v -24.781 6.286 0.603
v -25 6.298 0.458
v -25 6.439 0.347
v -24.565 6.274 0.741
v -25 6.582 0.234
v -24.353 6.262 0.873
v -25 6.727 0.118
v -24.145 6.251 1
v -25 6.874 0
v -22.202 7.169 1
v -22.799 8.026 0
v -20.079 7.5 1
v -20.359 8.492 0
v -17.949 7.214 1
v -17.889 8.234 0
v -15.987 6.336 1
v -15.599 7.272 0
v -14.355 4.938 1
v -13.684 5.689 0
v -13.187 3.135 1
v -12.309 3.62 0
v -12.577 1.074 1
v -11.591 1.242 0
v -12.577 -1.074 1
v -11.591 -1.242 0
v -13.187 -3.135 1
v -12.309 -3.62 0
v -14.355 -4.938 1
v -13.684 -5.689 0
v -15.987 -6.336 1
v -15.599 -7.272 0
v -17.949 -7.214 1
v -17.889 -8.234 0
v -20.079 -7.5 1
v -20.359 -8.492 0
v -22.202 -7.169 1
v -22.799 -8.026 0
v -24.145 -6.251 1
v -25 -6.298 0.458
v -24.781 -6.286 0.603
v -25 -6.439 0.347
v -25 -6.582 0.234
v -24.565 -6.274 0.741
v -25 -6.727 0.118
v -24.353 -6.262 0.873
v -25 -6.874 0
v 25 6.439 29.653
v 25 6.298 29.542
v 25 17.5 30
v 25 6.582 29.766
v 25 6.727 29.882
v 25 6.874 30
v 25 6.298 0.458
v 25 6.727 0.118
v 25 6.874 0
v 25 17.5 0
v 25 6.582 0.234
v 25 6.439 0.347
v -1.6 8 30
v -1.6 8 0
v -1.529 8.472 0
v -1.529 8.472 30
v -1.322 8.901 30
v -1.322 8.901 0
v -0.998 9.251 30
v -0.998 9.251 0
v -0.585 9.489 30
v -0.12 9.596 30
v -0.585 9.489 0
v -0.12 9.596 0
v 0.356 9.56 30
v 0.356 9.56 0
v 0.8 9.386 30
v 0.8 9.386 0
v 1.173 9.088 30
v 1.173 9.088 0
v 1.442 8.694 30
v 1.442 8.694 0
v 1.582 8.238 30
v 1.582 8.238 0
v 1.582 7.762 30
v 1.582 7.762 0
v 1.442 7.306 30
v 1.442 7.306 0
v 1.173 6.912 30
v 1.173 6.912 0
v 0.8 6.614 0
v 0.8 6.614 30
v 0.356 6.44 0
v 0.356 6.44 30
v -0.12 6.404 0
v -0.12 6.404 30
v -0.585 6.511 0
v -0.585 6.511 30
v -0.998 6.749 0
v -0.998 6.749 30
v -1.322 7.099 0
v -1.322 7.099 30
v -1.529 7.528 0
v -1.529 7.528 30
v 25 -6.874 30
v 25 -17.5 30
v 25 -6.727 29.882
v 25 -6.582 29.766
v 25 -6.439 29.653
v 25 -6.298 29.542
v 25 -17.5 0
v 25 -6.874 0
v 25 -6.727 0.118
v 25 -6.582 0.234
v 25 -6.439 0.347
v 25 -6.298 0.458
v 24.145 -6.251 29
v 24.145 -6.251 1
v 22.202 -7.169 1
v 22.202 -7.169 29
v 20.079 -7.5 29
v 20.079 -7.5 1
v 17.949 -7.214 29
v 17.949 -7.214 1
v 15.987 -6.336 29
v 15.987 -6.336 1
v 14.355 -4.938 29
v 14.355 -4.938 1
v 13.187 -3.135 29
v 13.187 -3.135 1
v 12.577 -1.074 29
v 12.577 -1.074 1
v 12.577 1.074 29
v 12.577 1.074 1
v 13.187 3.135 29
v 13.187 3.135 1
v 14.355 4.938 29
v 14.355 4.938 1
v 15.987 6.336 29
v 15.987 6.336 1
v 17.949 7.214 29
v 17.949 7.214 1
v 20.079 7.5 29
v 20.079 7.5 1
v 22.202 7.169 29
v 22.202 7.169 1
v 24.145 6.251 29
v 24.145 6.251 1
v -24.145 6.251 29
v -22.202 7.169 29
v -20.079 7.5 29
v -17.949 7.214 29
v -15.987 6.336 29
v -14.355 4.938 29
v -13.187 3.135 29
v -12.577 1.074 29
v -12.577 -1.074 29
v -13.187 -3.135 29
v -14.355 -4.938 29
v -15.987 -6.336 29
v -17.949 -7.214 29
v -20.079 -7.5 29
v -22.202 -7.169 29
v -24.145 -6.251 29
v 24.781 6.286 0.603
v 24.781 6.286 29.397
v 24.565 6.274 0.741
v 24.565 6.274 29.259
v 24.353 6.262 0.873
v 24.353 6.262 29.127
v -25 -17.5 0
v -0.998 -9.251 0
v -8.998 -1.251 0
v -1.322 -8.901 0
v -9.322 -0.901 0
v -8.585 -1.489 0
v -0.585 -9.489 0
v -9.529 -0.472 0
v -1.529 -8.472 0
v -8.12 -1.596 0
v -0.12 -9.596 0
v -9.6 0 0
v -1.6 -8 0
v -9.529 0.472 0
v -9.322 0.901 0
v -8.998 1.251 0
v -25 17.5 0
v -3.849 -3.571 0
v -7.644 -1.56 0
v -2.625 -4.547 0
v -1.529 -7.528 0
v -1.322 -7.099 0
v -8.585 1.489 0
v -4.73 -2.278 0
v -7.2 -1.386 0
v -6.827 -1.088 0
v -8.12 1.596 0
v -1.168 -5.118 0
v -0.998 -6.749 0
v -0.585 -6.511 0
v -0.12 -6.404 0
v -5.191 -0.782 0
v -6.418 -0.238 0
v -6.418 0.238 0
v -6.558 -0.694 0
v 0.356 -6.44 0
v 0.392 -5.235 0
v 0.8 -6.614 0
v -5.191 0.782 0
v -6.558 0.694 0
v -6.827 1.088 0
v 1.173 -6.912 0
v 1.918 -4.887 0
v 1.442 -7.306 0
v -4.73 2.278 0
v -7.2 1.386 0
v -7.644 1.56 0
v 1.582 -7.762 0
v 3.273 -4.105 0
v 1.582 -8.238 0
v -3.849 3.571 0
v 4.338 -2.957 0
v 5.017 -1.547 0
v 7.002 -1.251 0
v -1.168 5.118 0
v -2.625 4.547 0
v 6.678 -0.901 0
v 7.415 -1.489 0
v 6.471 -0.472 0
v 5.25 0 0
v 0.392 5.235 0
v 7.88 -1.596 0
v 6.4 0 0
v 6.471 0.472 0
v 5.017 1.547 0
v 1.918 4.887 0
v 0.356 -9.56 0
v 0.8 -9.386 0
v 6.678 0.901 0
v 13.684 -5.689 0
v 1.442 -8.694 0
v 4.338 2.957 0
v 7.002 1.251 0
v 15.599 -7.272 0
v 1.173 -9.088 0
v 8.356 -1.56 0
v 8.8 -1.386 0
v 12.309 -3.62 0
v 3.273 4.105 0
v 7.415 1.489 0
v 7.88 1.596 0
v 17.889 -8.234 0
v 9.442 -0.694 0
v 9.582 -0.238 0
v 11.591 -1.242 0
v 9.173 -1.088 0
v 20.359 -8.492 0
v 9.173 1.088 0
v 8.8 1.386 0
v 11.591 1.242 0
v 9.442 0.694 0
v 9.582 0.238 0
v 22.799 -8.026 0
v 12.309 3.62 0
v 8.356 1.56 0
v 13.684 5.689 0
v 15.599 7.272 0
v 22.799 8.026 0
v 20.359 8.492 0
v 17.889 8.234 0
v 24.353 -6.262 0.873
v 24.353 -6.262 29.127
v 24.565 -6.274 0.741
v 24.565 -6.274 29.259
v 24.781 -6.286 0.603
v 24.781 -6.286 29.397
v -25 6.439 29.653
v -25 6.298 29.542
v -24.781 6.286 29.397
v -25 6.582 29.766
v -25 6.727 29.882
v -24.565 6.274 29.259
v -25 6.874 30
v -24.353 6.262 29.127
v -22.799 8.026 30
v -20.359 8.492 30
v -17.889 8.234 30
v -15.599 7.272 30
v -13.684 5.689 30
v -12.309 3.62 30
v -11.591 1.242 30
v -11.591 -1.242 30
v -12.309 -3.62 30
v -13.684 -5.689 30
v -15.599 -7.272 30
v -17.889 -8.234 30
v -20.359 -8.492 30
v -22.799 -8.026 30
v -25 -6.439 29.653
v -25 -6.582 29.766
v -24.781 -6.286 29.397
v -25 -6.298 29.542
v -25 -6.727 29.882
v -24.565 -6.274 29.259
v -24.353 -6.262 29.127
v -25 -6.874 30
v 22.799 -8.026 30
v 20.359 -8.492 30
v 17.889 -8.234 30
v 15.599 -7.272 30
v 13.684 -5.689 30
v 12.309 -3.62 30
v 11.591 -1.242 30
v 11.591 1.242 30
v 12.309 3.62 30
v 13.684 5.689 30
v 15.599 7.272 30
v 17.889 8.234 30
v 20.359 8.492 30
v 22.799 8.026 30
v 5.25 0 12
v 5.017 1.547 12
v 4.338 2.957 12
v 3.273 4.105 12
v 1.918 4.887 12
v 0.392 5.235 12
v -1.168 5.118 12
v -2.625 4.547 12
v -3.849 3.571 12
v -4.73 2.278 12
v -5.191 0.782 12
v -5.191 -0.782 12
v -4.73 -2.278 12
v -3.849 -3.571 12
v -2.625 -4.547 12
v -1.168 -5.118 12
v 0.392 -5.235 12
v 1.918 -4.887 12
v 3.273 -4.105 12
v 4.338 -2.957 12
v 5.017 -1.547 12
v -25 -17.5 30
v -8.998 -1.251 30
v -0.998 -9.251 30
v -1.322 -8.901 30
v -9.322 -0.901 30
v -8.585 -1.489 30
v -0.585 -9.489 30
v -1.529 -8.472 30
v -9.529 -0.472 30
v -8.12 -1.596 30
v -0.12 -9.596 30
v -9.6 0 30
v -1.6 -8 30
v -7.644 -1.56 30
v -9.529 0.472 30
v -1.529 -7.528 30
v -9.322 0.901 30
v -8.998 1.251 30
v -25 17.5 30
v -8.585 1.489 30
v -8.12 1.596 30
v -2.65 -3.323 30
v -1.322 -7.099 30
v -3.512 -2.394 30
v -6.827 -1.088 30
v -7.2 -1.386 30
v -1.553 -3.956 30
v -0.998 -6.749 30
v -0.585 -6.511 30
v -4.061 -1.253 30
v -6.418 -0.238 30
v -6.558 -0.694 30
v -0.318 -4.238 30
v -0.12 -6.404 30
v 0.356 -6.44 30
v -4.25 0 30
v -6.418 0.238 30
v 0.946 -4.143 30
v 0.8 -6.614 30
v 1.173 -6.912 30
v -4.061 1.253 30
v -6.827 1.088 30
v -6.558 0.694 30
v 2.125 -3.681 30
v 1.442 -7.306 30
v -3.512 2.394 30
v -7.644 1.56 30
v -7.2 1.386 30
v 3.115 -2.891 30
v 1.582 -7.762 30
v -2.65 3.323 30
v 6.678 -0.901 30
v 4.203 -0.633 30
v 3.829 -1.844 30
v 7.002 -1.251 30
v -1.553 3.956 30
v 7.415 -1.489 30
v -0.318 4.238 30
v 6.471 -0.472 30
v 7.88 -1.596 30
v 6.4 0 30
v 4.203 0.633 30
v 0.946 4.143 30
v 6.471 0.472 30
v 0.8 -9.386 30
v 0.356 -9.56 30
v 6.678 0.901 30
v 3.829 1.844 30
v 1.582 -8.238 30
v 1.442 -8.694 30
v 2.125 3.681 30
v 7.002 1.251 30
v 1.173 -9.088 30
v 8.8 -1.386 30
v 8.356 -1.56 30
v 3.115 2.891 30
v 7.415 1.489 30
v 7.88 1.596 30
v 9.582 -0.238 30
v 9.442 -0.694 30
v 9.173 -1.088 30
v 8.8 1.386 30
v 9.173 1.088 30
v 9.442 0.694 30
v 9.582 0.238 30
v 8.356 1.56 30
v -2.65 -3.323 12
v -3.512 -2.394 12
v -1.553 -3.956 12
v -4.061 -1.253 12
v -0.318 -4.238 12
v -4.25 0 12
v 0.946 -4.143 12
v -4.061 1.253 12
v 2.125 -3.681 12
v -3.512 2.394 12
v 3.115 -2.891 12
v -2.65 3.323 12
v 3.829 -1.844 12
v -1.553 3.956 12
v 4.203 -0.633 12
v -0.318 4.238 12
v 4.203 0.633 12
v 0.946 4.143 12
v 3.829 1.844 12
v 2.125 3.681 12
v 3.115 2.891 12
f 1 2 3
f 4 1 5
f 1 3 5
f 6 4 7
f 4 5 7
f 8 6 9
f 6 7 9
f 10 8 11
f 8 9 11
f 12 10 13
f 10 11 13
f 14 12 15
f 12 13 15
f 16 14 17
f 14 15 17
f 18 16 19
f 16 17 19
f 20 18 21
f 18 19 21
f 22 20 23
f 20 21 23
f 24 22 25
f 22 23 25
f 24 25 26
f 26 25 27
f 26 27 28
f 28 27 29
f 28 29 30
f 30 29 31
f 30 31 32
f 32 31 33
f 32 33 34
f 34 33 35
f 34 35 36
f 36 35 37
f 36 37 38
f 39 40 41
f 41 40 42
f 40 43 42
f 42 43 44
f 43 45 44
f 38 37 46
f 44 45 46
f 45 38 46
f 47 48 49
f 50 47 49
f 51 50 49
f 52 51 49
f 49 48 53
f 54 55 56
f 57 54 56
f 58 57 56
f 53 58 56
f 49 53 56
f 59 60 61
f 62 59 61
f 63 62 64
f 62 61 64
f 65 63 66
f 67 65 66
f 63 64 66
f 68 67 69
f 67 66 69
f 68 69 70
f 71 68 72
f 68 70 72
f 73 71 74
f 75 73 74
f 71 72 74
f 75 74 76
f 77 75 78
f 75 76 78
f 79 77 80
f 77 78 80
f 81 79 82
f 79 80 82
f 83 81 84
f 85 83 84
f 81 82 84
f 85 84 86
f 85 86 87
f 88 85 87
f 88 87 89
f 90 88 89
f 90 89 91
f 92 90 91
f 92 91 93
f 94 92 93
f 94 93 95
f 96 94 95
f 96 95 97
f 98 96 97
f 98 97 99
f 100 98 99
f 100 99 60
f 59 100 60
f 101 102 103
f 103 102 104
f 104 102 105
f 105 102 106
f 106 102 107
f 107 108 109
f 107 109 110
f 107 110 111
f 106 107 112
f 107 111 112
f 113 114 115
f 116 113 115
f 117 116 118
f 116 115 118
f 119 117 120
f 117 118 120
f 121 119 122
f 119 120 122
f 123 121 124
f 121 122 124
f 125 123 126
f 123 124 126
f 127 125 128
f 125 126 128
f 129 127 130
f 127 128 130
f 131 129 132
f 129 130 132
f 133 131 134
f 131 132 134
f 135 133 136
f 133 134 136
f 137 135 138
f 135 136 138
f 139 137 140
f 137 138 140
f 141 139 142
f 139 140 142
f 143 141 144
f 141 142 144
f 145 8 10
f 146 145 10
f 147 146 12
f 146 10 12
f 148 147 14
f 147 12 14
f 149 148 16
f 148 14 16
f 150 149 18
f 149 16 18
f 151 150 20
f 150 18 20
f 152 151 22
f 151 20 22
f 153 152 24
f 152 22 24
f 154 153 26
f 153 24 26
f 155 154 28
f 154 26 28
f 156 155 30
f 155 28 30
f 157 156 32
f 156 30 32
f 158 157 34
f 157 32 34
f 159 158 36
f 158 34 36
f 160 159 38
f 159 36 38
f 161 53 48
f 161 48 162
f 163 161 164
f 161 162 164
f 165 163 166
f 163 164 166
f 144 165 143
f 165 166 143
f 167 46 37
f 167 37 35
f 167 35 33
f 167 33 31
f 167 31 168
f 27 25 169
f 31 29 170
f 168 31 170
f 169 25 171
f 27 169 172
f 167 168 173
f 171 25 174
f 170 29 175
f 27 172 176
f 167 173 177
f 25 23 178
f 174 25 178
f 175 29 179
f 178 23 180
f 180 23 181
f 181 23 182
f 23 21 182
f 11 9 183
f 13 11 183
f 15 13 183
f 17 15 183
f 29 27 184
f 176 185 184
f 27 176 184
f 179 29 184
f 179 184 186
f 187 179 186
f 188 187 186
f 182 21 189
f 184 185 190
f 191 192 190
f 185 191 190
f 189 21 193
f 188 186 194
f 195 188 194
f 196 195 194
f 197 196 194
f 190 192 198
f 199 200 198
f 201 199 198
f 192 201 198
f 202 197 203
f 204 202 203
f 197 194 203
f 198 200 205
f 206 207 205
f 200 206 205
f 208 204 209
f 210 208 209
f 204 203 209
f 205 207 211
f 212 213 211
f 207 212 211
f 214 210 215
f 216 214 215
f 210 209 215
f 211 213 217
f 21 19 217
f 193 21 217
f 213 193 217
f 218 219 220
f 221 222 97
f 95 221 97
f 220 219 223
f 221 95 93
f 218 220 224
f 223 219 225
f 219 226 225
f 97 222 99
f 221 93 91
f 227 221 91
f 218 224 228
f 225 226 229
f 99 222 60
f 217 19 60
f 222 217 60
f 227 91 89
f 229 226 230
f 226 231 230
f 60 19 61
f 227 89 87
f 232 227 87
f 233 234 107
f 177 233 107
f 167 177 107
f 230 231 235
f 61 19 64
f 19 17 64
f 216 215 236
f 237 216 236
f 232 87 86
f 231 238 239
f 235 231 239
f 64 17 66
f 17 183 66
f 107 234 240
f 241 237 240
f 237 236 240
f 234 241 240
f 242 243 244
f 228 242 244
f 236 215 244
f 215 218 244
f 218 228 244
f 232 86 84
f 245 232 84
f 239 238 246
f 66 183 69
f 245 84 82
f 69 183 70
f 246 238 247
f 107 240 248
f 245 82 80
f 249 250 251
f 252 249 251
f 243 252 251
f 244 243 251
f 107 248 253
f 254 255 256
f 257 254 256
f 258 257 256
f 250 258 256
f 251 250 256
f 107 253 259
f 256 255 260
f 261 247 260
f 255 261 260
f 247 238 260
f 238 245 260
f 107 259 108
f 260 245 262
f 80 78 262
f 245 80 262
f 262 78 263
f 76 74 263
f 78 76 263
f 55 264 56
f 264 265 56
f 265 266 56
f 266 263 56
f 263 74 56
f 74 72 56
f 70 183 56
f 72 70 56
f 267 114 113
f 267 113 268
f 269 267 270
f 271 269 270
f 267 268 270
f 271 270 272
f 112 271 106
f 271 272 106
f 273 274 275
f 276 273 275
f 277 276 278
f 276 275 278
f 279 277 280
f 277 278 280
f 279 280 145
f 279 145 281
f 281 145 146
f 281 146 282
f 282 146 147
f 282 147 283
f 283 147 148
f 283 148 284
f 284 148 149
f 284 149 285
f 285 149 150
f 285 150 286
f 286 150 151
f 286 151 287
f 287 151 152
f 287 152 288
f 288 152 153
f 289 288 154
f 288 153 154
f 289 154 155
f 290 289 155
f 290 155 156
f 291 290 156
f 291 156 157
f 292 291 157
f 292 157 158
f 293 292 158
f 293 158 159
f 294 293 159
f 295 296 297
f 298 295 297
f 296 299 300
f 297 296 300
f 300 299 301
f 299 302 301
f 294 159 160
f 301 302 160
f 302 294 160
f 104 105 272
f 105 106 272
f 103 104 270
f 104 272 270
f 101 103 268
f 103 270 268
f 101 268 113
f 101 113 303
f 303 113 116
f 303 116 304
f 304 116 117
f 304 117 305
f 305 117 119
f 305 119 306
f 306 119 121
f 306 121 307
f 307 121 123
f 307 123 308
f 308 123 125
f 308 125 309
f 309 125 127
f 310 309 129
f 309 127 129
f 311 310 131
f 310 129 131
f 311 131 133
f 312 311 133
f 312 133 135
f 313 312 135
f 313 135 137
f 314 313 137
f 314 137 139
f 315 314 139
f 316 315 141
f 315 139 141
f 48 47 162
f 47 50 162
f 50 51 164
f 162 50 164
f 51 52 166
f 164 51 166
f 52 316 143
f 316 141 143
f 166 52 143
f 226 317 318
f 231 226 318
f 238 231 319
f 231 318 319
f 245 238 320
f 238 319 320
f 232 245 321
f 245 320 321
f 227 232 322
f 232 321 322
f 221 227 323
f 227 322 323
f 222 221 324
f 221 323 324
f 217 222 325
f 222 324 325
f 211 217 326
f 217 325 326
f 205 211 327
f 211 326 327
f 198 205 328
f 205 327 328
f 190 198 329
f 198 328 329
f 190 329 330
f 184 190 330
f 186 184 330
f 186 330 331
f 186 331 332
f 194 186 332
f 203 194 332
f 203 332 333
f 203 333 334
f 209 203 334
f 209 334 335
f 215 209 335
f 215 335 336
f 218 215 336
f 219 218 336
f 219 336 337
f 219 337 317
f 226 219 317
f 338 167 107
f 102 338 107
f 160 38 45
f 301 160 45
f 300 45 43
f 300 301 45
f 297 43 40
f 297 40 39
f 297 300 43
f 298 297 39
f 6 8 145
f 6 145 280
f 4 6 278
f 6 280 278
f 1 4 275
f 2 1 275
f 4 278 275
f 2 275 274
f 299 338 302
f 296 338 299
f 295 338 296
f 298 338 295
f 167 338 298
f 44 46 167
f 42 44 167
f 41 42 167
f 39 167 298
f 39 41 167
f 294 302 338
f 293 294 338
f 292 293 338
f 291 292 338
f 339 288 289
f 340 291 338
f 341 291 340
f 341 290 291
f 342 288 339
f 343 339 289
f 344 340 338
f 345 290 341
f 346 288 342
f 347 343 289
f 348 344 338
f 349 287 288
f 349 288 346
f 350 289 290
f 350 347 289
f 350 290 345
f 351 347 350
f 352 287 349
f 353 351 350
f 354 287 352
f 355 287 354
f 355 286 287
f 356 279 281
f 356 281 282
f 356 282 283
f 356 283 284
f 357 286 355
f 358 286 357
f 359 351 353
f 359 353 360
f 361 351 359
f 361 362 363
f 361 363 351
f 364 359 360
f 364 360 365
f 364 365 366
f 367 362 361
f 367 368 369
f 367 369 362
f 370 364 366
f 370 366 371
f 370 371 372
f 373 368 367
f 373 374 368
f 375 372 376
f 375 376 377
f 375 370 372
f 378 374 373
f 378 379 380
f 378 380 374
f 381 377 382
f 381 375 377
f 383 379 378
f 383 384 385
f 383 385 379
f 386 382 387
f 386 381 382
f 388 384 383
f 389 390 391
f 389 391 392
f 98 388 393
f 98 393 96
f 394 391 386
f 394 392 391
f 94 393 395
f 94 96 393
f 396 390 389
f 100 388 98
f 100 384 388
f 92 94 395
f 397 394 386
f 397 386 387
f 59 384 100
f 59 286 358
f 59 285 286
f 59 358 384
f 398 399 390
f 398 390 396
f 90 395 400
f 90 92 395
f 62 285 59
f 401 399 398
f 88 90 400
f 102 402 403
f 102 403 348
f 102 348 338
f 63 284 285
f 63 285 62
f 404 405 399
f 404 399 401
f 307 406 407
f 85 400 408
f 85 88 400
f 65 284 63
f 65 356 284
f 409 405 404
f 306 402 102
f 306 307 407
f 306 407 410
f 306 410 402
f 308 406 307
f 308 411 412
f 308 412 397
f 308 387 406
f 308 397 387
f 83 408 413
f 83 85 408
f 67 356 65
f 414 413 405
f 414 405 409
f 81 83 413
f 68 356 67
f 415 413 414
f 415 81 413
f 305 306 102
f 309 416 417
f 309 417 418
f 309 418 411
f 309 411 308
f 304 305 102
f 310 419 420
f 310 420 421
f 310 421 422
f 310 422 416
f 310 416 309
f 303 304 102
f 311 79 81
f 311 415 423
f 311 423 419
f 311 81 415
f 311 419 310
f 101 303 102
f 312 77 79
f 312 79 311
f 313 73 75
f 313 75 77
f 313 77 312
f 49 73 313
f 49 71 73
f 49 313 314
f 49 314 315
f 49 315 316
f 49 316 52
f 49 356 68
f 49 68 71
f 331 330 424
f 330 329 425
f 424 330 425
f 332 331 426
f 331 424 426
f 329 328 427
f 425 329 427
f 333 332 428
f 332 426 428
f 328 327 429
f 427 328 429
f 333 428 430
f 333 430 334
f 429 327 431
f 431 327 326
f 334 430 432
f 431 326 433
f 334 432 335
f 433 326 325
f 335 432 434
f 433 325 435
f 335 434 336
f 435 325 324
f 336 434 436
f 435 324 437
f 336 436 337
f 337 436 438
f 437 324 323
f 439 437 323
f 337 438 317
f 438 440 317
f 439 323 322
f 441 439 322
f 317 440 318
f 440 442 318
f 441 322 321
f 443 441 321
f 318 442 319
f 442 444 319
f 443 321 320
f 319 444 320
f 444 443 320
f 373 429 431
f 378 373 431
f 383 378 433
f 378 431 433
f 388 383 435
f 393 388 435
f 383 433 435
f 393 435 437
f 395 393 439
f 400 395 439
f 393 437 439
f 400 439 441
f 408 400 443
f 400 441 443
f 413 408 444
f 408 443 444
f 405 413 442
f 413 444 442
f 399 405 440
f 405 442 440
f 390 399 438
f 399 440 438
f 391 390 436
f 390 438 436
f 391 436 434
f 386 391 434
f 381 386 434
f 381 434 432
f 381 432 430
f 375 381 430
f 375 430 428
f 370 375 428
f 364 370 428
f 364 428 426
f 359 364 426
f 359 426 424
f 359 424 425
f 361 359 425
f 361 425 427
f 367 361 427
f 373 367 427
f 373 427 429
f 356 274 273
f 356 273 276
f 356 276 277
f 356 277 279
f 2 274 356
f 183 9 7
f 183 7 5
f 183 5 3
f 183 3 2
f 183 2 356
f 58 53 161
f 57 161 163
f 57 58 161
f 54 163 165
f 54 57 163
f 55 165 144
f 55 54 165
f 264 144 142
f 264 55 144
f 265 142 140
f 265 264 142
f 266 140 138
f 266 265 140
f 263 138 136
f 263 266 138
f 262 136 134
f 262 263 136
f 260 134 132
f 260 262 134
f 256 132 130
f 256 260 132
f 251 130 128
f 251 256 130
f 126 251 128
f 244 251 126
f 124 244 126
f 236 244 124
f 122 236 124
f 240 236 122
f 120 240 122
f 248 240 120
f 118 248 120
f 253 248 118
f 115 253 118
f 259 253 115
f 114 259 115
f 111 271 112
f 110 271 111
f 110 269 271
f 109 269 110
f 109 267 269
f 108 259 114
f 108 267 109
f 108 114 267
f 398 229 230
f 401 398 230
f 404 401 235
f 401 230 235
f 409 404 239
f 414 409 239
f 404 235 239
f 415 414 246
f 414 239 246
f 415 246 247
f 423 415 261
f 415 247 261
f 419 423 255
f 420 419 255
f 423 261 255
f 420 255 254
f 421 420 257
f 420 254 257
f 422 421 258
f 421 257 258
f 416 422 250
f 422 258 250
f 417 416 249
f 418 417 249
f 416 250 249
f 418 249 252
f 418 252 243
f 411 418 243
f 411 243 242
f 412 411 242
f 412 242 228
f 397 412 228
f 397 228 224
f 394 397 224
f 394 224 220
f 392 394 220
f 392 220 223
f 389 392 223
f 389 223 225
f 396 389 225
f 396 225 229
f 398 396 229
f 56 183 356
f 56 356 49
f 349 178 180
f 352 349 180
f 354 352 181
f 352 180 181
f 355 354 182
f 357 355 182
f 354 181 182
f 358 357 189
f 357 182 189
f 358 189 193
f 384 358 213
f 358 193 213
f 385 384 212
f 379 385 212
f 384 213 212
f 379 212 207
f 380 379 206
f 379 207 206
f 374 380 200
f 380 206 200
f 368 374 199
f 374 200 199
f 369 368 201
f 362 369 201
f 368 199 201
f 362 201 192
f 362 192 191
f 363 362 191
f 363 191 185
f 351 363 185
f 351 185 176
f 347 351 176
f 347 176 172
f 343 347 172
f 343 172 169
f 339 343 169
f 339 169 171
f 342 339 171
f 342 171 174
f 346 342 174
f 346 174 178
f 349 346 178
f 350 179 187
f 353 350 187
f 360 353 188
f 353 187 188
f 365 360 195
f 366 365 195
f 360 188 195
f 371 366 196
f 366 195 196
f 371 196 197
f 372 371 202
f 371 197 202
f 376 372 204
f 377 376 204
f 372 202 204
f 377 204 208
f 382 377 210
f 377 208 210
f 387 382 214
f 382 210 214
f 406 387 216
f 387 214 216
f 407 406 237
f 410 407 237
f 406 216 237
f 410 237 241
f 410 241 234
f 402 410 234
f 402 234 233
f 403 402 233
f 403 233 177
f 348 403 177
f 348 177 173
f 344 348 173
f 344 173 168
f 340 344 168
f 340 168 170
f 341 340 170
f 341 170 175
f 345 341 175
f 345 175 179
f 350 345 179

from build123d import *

# Parameters (mm, degrees)
SKETCH_1_W          = 50
SKETCH_1_H          = 35
EXTRUDE_1_DEPTH     = 30
HOLE_WIZARD_345_D   = 8.5
HOLE_WIZARD_450_D   = 3.2
HOLE_WIZARD_604_D   = 15
CHAMFER_1_SIZE      = 1
CHAMFER_1_SIZE_2    = 0.708203932
HOLE_WIZARD_1_D     = 10.5
HOLE_WIZARD_1_DEPTH = 12


with BuildPart() as part:
    # 草图1 → 凸台-拉伸1 (new body)
    with BuildSketch(Plane.XY):
        Rectangle(SKETCH_1_W, SKETCH_1_H)
    extrude(amount=EXTRUDE_1_DEPTH)

    # Hole Wizard 345 (through all)
    with Locations(Plane.XY.offset(30)):
        with Locations((0, 0)):
            Hole(HOLE_WIZARD_345_D / 2)

    # Hole Wizard 450 (through all)
    with Locations(Plane.XY.offset(30)):
        with Locations((8, 0), (0, 8), (-8, 0), (0, -8)):
            Hole(HOLE_WIZARD_450_D / 2)

    # Hole Wizard 604 (through all)
    with Locations(Plane.XY.offset(30)):
        with Locations((20, 0), (-20, 0)):
            Hole(HOLE_WIZARD_604_D / 2)

    # 倒角1
    # the kernel refuses this chamfer: 1, 0.708203932 mm, written as the material it takes off along each edge
    with BuildSketch(Plane(origin=(-20, 0, 0), x_dir=(-0.8790200859122482, 0.4767847402789059, 0), z_dir=(-0.4767847402789059, -0.8790200859122482, 0))) as chamfer_1_piece_1:
        Polygon((7.5, -CHAMFER_1_SIZE), (7.5 + CHAMFER_1_SIZE, 0), (7.5, 0), align=None)
    revolve(axis=Axis((-20, 0, 0), (0, 0, -1)), revolution_arc=303.048763938, mode=Mode.SUBTRACT)
    with BuildSketch(Plane(origin=(-20, 0, 30), x_dir=(-0.879020085912248, 0.47678474027890627, 0), z_dir=(-0.47678474027890627, -0.879020085912248, 0))) as chamfer_1_piece_2:
        Polygon((7.5 + CHAMFER_1_SIZE, 0), (7.5, CHAMFER_1_SIZE), (7.5, 0), align=None)
    revolve(axis=Axis((-20, 0, 30), (0, 0, -1)), revolution_arc=303.048763938, mode=Mode.SUBTRACT)
    with BuildSketch(Plane(origin=(20, 0, 30), x_dir=(0.879020085912248, -0.4767847402789061, 0), z_dir=(0.4767847402789061, 0.879020085912248, 0))) as chamfer_1_piece_3:
        Polygon((7.5 + CHAMFER_1_SIZE, 0), (7.5, CHAMFER_1_SIZE), (7.5, 0), align=None)
    revolve(axis=Axis((20, 0, 30), (0, 0, -1)), revolution_arc=303.048763938, mode=Mode.SUBTRACT)
    with BuildSketch(Plane(origin=(20, 0, 0), x_dir=(0.8790200859122481, 0.476784740278906, 0), z_dir=(0.476784740278906, -0.8790200859122481, 0))) as chamfer_1_piece_4:
        Polygon((7.5, CHAMFER_1_SIZE), (7.5 + CHAMFER_1_SIZE, 0), (7.5, 0), align=None)
    revolve(axis=Axis((20, 0, 0), (0, 0, 1)), revolution_arc=303.048763938, mode=Mode.SUBTRACT)
    with BuildSketch(Plane(origin=(-25, 5.590169944, 32.778051389), x_dir=(0.7914486393779661, 0.611235675682274, 0), z_dir=(0, 0, -1)), Plane(origin=(25, -5.590169944, 32.778051389), x_dir=(-0.7914486393779661, -0.611235675682274, 0), z_dir=(0, 0, -1))) as chamfer_1_piece_5:
        with BuildLine():
            Line((1.080663788, 0), (CHAMFER_1_SIZE_2 * 0.611235676113, -CHAMFER_1_SIZE_2 * 0.791448639936))
            Line((CHAMFER_1_SIZE_2 * 0.611235676113, -CHAMFER_1_SIZE_2 * 0.791448639936), (0, 0))
            ThreePointArc((0, 0), (0.555522087, -0.019473843), (1.080663788, 0))
        make_face()
    extrude(amount=35.556102778, mode=Mode.SUBTRACT)
    with BuildSketch(Plane(origin=(-25, -5.590169944, 32.778051389), x_dir=(0.7914486393779665, -0.6112356756822735, 0), z_dir=(0, 0, -1))) as chamfer_1_piece_6:
        with BuildLine():
            Line((1.080663788, 0), (CHAMFER_1_SIZE_2 * 0.611235676113, CHAMFER_1_SIZE_2 * 0.791448639936))
            Line((CHAMFER_1_SIZE_2 * 0.611235676113, CHAMFER_1_SIZE_2 * 0.791448639936), (0, 0))
            ThreePointArc((0, 0), (0.555522087, 0.019473843), (1.080663788, 0))
        make_face()
    extrude(amount=35.556102778, mode=Mode.SUBTRACT)
    with BuildSketch(Plane(origin=(25, 5.590169944, 32.778051389), x_dir=(0, 1, 0), z_dir=(0, 0, -1))) as chamfer_1_piece_7:
        with BuildLine():
            Line((CHAMFER_1_SIZE_2, 0), (0.660540261, -0.855289885))
            ThreePointArc((0.660540261, -0.855289885), (0.354967464, -0.427764092), (0, 0))
            Line((0, 0), (CHAMFER_1_SIZE_2, 0))
        make_face()
    extrude(amount=35.556102778, mode=Mode.SUBTRACT)

    # 孔1
    with Locations(Plane(origin=(0, 0, 0), x_dir=(-1, 0, 0), z_dir=(0, 0, -1))):
        with Locations((0, 0)):
            Hole(HOLE_WIZARD_1_D / 2, depth=HOLE_WIZARD_1_DEPTH)


solid = part.part
